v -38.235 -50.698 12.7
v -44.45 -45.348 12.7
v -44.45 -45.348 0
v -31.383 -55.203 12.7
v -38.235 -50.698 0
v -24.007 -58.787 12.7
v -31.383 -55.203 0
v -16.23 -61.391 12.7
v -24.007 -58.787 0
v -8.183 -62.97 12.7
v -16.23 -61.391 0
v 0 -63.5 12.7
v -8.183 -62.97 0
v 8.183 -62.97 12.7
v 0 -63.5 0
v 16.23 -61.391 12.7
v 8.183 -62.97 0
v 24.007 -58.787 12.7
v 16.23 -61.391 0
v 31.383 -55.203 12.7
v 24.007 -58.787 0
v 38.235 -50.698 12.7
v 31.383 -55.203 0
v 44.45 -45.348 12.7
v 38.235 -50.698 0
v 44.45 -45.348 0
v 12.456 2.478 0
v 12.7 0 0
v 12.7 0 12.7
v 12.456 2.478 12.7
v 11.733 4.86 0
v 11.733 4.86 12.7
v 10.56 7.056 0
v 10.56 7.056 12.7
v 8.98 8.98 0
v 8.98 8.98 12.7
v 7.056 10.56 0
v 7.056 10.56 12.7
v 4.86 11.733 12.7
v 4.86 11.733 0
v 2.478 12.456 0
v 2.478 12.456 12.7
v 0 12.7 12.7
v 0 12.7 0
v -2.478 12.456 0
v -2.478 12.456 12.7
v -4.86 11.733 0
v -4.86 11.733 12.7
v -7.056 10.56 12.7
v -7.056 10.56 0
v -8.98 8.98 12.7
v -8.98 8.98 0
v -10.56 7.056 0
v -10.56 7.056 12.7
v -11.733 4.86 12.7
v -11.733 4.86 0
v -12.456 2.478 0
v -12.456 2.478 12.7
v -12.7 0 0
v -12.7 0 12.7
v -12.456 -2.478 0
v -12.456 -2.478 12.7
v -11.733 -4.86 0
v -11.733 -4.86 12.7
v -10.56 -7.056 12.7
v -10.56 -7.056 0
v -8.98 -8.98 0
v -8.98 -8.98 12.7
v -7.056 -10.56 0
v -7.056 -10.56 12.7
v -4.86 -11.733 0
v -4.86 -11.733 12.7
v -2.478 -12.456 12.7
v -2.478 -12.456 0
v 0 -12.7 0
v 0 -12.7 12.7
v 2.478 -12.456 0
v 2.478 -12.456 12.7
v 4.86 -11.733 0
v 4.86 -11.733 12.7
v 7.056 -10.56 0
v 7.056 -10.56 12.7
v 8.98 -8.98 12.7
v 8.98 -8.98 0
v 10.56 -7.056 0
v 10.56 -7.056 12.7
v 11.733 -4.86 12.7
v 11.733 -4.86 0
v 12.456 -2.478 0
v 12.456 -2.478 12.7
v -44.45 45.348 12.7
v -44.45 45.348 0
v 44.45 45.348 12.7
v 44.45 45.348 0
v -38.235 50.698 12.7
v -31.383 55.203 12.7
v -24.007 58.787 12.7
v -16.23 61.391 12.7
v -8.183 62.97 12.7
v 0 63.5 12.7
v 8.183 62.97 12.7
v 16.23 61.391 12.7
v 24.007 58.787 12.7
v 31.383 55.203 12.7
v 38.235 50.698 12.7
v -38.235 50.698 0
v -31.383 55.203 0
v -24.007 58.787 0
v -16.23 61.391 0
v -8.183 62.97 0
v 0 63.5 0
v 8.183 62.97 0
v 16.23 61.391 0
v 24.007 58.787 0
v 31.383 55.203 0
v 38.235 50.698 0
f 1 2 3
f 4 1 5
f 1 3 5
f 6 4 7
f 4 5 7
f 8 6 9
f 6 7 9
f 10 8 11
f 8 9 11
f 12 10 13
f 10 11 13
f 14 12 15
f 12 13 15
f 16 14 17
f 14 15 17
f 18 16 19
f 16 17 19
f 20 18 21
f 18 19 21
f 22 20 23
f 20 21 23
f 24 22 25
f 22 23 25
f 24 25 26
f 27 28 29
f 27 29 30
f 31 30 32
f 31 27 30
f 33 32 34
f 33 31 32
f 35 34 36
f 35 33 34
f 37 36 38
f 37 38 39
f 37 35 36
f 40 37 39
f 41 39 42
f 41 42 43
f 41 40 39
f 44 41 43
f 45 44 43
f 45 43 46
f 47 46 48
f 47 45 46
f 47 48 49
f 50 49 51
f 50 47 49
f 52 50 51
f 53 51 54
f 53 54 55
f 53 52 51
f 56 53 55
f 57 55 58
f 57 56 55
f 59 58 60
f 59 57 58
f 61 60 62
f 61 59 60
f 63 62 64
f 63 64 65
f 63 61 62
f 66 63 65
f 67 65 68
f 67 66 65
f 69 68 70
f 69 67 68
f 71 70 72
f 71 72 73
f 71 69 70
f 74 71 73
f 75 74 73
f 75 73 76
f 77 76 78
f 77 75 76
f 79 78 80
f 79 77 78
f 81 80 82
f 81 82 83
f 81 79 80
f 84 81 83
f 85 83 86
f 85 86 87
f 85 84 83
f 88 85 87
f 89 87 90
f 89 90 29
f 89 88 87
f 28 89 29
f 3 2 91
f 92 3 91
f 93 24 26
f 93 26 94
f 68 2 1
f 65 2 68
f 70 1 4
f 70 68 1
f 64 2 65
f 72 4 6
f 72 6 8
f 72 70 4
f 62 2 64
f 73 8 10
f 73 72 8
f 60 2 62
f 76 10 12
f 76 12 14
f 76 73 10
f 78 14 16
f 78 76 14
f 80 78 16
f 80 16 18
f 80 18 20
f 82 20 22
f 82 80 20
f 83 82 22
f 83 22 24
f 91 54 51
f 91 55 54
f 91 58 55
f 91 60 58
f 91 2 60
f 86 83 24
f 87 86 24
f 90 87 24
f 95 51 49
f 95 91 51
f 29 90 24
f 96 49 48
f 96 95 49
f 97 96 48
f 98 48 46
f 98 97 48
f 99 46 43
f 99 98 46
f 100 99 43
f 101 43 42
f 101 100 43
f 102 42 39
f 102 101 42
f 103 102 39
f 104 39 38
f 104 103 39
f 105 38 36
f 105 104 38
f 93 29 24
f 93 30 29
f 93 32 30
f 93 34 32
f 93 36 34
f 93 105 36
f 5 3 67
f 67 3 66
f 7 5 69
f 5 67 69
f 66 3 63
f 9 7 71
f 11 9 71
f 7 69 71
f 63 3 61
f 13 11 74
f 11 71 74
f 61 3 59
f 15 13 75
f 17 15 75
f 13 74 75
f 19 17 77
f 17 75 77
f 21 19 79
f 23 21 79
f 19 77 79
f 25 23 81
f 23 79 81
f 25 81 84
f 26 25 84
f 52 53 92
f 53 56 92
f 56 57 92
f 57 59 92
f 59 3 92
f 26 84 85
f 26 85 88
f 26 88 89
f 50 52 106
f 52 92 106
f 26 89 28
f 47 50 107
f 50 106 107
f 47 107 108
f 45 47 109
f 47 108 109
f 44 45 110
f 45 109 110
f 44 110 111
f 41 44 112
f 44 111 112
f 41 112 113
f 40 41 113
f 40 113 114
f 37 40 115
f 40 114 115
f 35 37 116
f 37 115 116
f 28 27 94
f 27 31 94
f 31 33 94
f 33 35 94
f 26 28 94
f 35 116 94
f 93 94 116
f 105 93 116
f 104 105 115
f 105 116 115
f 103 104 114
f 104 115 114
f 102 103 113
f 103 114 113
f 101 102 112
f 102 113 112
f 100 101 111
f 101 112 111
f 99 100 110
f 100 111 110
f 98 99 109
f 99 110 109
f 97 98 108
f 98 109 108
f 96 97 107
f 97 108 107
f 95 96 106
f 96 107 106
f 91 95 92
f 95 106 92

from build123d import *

# Parameters (mm, degrees)
F0_R     = 63.5
F0_R_2   = 12.7
F1_DEPTH = 12.7
F3_W     = 54.029742
F3_H     = 140.439012
F3_W_2   = 66.675002
F3_H_2   = 141.013797
F4_DEPTH = 25.4


with BuildPart() as f1:
    # F0 (on Top) → F1 (new body)
    with BuildSketch(Plane.XY):
        Circle(F0_R)
        Circle(F0_R_2, mode=Mode.SUBTRACT)
    extrude(amount=F1_DEPTH)

    # F3 (on face) → F4 (cut)
    with BuildSketch(Plane.XY.offset(12.7)):
        with Locations((-71.464871, -3.700142)):
            Rectangle(F3_W, F3_H)
        with Locations((77.787501, -3.412749)):
            Rectangle(F3_W_2, F3_H_2)
    extrude(amount=-F4_DEPTH, mode=Mode.SUBTRACT)


solid = f1.part
